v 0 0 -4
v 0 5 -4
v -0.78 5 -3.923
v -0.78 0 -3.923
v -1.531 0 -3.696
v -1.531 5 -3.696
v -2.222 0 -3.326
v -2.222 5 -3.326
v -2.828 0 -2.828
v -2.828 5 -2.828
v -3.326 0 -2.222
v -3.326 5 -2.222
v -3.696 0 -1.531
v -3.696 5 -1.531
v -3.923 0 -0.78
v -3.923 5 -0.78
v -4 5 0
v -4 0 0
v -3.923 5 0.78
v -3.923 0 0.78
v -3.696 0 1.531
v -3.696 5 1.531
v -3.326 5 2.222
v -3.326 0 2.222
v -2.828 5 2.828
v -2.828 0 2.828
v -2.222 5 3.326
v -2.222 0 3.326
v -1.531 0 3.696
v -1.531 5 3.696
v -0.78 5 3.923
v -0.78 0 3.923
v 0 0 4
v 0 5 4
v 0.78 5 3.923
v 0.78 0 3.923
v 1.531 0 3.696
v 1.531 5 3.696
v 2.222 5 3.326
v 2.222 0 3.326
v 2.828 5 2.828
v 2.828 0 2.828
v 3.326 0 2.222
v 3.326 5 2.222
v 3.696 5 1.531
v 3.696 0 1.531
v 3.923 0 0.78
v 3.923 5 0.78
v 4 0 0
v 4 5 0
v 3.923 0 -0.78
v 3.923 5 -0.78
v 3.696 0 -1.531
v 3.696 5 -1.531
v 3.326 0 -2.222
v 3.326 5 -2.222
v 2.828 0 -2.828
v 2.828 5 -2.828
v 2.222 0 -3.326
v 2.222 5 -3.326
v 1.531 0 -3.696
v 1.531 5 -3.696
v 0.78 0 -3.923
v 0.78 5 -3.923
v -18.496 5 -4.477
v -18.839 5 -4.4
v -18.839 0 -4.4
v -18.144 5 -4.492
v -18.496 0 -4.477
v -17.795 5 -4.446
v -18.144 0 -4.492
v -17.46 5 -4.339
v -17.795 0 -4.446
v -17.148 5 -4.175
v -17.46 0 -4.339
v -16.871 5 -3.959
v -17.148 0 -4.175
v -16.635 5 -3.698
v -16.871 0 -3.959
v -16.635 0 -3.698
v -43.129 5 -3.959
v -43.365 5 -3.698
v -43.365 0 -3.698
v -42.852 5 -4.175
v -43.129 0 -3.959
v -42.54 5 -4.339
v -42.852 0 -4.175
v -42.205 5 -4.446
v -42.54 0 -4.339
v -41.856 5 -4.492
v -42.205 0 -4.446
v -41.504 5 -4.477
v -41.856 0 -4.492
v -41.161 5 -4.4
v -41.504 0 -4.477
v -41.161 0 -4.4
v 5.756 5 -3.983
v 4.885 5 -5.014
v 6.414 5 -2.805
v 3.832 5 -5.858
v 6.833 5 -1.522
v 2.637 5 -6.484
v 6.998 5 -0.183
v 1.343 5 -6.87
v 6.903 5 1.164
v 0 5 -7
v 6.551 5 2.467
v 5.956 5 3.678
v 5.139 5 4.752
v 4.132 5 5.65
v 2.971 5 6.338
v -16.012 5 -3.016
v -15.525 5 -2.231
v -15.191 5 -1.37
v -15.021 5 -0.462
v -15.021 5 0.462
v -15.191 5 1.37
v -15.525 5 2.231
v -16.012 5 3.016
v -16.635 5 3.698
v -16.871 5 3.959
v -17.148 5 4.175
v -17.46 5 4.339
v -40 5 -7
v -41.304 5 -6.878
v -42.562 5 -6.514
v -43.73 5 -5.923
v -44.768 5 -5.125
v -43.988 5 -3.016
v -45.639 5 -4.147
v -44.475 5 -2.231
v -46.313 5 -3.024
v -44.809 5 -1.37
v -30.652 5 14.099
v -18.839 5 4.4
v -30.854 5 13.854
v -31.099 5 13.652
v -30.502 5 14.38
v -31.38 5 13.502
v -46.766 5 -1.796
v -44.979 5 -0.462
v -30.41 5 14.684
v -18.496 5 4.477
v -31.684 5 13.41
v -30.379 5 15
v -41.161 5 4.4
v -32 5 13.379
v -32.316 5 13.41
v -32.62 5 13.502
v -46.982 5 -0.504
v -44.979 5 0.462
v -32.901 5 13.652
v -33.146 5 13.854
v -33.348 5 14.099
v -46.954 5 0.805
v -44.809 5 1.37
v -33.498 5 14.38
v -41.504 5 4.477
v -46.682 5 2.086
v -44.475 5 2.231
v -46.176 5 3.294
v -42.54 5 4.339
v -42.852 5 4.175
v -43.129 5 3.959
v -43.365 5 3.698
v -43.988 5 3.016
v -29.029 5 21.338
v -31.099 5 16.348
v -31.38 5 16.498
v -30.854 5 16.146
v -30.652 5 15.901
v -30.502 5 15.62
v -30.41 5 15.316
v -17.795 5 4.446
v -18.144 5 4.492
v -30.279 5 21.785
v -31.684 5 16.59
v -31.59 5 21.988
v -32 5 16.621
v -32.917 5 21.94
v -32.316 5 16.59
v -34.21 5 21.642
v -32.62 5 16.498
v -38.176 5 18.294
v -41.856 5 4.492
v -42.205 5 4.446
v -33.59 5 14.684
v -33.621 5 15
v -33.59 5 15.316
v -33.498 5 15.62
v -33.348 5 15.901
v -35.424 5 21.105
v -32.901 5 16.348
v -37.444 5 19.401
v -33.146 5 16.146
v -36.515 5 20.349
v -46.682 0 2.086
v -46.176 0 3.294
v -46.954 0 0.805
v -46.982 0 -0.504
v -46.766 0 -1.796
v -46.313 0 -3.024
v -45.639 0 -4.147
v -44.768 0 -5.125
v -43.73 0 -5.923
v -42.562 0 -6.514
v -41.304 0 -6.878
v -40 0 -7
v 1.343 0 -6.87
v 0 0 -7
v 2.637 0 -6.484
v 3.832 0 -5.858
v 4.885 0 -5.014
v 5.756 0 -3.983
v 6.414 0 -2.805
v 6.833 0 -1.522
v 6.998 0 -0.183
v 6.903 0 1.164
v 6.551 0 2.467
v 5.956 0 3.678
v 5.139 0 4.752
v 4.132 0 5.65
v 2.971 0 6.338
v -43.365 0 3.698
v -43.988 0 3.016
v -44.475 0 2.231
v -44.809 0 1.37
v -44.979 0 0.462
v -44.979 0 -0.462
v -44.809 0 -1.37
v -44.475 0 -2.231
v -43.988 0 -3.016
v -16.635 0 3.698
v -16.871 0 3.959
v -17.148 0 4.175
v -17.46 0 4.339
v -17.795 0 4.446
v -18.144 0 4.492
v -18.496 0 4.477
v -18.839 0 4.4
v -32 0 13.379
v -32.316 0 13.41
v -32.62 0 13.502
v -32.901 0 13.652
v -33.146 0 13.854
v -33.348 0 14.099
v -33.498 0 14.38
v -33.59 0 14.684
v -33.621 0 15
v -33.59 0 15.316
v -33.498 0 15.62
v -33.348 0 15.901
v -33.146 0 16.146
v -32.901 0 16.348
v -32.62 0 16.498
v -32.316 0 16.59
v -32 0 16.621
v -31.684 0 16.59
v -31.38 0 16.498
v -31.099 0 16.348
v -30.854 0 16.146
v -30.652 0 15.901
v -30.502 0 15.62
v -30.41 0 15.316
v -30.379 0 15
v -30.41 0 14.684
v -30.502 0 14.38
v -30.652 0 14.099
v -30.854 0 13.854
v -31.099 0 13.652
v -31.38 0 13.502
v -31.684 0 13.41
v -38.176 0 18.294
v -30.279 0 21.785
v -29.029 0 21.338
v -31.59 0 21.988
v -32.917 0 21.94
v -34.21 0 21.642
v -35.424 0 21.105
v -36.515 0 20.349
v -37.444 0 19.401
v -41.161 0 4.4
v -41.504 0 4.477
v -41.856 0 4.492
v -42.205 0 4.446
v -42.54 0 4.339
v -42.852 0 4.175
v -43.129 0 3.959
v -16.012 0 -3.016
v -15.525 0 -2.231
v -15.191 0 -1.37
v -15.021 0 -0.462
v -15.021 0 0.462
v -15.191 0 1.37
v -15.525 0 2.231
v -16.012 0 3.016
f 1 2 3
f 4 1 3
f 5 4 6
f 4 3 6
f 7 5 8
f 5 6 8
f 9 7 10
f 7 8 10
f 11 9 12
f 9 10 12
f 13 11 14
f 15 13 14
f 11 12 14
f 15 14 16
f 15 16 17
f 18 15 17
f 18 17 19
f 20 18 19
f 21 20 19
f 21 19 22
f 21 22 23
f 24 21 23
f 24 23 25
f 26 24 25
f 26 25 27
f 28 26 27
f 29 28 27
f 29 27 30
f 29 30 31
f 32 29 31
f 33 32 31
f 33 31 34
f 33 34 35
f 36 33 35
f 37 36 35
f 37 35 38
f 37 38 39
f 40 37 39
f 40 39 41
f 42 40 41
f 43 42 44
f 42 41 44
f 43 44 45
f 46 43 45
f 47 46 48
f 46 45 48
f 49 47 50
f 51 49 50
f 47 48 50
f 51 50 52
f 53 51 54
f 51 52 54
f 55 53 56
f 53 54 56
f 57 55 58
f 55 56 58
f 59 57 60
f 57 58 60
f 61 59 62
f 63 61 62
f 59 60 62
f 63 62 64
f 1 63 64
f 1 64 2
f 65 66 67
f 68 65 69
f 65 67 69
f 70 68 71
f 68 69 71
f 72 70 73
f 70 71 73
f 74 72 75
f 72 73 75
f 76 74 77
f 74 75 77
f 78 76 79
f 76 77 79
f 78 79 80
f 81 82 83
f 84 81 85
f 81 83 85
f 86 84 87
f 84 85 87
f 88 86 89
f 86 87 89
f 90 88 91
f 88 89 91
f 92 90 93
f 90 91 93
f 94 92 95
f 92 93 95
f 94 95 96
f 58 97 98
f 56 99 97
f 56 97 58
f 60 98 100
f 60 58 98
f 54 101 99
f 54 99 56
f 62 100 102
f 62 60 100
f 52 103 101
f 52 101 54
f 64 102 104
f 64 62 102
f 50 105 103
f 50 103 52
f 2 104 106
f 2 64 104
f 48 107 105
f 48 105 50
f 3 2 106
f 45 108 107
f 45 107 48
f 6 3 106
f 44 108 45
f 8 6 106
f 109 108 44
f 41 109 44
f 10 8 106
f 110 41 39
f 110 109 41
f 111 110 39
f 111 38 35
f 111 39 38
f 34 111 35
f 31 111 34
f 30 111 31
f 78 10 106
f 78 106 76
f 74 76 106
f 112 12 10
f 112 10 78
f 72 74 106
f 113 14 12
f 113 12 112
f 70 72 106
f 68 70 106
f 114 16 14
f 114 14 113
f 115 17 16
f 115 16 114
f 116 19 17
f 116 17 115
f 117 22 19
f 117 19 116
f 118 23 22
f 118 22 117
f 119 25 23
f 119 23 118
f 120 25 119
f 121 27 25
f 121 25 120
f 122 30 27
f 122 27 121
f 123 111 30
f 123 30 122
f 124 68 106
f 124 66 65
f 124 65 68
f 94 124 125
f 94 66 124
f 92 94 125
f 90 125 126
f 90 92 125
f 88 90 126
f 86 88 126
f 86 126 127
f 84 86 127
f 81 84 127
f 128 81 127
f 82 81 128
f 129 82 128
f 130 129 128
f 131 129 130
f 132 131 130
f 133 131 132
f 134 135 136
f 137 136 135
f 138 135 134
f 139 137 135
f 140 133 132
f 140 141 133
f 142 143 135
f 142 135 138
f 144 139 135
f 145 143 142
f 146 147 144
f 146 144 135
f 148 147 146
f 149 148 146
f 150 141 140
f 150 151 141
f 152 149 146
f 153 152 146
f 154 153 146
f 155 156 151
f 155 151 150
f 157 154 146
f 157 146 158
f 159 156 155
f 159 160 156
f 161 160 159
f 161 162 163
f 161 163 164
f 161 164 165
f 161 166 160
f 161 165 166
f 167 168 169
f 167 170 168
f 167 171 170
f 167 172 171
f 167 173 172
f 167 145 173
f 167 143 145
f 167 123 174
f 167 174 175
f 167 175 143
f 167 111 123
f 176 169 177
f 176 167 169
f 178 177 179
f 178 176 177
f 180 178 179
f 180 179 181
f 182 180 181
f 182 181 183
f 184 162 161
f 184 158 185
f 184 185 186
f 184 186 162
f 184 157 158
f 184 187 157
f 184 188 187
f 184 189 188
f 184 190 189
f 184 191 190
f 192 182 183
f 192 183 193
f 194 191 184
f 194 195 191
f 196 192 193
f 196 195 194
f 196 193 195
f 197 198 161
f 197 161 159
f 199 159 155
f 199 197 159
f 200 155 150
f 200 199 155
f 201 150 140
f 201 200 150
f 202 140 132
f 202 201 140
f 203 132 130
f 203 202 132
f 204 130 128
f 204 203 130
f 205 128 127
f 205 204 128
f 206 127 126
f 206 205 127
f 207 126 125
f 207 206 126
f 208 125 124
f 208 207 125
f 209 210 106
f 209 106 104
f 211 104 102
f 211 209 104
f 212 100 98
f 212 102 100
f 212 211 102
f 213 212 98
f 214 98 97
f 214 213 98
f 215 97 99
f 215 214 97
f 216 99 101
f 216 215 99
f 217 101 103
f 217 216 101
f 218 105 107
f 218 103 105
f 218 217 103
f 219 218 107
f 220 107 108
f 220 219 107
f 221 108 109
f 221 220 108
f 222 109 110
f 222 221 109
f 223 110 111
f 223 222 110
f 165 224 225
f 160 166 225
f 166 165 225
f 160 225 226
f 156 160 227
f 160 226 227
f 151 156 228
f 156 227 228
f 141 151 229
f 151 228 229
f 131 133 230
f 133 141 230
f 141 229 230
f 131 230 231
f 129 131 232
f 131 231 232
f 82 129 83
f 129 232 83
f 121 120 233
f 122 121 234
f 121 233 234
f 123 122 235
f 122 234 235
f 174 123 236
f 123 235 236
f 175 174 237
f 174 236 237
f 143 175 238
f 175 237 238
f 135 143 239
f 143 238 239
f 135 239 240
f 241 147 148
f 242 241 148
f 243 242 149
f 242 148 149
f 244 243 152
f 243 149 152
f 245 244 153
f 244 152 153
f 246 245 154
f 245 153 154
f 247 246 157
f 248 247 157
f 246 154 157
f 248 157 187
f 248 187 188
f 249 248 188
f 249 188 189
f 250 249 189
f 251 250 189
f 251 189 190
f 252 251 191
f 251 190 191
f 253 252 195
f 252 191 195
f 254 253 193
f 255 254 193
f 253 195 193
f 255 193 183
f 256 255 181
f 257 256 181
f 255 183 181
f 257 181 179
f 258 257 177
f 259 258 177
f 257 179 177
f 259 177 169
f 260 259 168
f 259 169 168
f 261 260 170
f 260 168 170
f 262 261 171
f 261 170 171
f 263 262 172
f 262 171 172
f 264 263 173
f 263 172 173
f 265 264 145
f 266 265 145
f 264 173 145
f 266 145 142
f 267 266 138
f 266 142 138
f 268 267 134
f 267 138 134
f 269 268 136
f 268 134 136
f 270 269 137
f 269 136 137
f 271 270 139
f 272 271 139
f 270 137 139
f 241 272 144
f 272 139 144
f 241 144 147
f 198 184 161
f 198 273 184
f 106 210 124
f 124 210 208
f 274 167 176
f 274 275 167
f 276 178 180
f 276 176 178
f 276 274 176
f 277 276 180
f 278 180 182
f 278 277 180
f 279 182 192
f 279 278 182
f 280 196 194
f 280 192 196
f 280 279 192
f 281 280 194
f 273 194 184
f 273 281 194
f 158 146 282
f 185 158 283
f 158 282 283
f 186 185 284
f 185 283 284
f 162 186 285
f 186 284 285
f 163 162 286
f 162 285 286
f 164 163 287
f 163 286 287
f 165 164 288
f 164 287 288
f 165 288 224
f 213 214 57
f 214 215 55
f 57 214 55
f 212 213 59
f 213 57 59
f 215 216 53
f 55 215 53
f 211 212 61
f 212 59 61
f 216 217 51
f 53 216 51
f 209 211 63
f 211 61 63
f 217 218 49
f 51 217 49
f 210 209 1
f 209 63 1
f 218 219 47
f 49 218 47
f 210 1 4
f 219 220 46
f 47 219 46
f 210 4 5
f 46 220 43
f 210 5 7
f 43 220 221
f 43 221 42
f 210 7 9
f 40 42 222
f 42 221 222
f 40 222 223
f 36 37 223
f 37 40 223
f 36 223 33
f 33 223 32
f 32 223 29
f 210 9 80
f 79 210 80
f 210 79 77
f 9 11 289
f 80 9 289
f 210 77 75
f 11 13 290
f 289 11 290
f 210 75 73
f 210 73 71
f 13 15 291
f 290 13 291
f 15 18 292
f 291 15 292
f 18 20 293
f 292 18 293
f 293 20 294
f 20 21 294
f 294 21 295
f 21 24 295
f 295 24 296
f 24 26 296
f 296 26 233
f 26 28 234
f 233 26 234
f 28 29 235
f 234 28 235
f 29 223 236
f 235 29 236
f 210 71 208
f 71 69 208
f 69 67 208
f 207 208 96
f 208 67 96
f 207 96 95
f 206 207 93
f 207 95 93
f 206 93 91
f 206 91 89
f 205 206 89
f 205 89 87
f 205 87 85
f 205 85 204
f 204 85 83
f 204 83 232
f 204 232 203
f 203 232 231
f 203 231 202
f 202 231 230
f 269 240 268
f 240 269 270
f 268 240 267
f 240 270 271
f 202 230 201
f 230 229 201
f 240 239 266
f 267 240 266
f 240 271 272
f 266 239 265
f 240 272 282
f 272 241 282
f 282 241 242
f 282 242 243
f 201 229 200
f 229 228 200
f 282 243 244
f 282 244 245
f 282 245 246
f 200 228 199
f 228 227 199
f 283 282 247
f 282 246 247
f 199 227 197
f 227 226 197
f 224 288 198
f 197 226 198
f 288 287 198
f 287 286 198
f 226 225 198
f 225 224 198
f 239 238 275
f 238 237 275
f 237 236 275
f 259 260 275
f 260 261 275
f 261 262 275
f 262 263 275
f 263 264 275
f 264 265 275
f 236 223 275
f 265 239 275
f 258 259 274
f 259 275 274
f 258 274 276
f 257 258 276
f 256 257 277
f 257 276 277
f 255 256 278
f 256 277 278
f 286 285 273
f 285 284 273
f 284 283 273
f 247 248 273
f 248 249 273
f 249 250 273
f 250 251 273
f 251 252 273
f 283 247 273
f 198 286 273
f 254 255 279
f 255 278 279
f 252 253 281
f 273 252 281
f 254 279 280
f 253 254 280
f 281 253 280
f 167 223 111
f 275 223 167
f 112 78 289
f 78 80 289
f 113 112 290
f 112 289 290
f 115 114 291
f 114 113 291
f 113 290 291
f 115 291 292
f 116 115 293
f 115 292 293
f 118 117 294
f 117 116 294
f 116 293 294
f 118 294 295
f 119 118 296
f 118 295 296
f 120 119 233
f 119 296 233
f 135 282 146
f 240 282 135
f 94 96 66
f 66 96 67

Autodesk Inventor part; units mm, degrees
ref_plane "YZ Plane" through (0, 0, 0) normal (1, 0, 0) x (0, 1, 0)
ref_plane "XZ Plane" through (0, 0, 0) normal (0, 1, 0) x (-1, 0, 0)
ref_plane "XY Plane" through (0, 0, 0) normal (0, 0, 1) x (1, 0, 0)
sketch "Sketch1" plane through (0, 0, 0) normal (0, 1, 0) x (-1, 0, 0)
  arc A0 (-2.971, 6.3382) -> (0, -7) centre (0, 0) ccw
  line L0 (0, 0) -> (40, 0) construction
  arc A1 (42.3749, -4.4) -> (42.3749, 4.4) centre (40, 0) ccw
  circle A2 centre (20, 0) radius 20 construction
  circle A3 centre (0, 0) radius 40 construction
  line L1 (42.3749, 4.4) -> (17.6251, 4.4)
  line L2 (0, 0) -> (10, -17.3205) construction
  line L3 (10, -17.3205) -> (20, -34.641) construction
  arc A4 (17.6251, 4.4) -> (17.6251, -4.4) centre (20, 0) ccw
  line L4 (42.3749, -4.4) -> (17.6251, -4.4)
  line L5 (30, 4.4) -> (30, -4.4) construction
  circle A5 centre (40, 0) radius 7 construction
  circle A6 centre (0, 0) radius 7 construction
  circle A7 centre (32, 15) radius 7 construction
  line L6 (-2.971, 6.3382) -> (29.029, 21.3382)
  line L7 (38.1765, 18.2941) -> (46.1765, 3.2941)
  line L8 (0, -7) -> (40, -7)
  arc A8 (40, -7) -> (46.1765, 3.2941) centre (40, 0) ccw
  arc A9 (38.1765, 18.2941) -> (29.029, 21.3382) centre (32, 15) ccw
  arc A10 (43.3651, 3.6981) -> (41.1611, 4.4) centre (41.768, 2.4943) ccw
  arc A11 (41.1611, -4.4) -> (43.3651, -3.6981) centre (41.768, -2.4943) ccw
  arc A12 (18.8389, 4.4) -> (16.6349, 3.6981) centre (18.232, 2.4943) ccw
  arc A13 (16.6349, -3.6981) -> (18.8389, -4.4) centre (18.232, -2.4943) ccw
  circle A14 centre (0, 0) radius 4 construction
  point P0 (16.6349, -3.6981)
  point P1 (16.6349, 3.6981)
  point P2 (18.8389, 4.4)
  point P3 (43.3651, -3.6981)
  point P4 (41.1611, -4.4)
  point P5 (18.8389, -4.4)
  dimension "d0" = 32
  dimension "d1" = 15
  dimension "d2" = 20
  dimension "d3" = 60
  dimension "d4" = 20
  dimension "d5" = 10
  dimension "d6" = 8.8
  dimension "d7" = 20
  dimension "d9" = 14
  dimension "d10" = 2
  dimension "d20" = 8
extrude "Extrusion1" add sketch "Sketch1" along normal blind 5
hole "Phi8.0-h7" at (0, 0, 0) direction (0, 1, 0) diameter 8 end through all
hole "M4" at (-32, 0, 15) direction (0, 1, 0) diameter 3.242 end through all thread size "M4x0.7" class "6H" standard "ANSI Metric M Profile"
equation "\"d7\" = d4"
equation "\"d13\" = d20"
properties part number "ParallelLinksDriveFrame" material "Aluminum 7075"
